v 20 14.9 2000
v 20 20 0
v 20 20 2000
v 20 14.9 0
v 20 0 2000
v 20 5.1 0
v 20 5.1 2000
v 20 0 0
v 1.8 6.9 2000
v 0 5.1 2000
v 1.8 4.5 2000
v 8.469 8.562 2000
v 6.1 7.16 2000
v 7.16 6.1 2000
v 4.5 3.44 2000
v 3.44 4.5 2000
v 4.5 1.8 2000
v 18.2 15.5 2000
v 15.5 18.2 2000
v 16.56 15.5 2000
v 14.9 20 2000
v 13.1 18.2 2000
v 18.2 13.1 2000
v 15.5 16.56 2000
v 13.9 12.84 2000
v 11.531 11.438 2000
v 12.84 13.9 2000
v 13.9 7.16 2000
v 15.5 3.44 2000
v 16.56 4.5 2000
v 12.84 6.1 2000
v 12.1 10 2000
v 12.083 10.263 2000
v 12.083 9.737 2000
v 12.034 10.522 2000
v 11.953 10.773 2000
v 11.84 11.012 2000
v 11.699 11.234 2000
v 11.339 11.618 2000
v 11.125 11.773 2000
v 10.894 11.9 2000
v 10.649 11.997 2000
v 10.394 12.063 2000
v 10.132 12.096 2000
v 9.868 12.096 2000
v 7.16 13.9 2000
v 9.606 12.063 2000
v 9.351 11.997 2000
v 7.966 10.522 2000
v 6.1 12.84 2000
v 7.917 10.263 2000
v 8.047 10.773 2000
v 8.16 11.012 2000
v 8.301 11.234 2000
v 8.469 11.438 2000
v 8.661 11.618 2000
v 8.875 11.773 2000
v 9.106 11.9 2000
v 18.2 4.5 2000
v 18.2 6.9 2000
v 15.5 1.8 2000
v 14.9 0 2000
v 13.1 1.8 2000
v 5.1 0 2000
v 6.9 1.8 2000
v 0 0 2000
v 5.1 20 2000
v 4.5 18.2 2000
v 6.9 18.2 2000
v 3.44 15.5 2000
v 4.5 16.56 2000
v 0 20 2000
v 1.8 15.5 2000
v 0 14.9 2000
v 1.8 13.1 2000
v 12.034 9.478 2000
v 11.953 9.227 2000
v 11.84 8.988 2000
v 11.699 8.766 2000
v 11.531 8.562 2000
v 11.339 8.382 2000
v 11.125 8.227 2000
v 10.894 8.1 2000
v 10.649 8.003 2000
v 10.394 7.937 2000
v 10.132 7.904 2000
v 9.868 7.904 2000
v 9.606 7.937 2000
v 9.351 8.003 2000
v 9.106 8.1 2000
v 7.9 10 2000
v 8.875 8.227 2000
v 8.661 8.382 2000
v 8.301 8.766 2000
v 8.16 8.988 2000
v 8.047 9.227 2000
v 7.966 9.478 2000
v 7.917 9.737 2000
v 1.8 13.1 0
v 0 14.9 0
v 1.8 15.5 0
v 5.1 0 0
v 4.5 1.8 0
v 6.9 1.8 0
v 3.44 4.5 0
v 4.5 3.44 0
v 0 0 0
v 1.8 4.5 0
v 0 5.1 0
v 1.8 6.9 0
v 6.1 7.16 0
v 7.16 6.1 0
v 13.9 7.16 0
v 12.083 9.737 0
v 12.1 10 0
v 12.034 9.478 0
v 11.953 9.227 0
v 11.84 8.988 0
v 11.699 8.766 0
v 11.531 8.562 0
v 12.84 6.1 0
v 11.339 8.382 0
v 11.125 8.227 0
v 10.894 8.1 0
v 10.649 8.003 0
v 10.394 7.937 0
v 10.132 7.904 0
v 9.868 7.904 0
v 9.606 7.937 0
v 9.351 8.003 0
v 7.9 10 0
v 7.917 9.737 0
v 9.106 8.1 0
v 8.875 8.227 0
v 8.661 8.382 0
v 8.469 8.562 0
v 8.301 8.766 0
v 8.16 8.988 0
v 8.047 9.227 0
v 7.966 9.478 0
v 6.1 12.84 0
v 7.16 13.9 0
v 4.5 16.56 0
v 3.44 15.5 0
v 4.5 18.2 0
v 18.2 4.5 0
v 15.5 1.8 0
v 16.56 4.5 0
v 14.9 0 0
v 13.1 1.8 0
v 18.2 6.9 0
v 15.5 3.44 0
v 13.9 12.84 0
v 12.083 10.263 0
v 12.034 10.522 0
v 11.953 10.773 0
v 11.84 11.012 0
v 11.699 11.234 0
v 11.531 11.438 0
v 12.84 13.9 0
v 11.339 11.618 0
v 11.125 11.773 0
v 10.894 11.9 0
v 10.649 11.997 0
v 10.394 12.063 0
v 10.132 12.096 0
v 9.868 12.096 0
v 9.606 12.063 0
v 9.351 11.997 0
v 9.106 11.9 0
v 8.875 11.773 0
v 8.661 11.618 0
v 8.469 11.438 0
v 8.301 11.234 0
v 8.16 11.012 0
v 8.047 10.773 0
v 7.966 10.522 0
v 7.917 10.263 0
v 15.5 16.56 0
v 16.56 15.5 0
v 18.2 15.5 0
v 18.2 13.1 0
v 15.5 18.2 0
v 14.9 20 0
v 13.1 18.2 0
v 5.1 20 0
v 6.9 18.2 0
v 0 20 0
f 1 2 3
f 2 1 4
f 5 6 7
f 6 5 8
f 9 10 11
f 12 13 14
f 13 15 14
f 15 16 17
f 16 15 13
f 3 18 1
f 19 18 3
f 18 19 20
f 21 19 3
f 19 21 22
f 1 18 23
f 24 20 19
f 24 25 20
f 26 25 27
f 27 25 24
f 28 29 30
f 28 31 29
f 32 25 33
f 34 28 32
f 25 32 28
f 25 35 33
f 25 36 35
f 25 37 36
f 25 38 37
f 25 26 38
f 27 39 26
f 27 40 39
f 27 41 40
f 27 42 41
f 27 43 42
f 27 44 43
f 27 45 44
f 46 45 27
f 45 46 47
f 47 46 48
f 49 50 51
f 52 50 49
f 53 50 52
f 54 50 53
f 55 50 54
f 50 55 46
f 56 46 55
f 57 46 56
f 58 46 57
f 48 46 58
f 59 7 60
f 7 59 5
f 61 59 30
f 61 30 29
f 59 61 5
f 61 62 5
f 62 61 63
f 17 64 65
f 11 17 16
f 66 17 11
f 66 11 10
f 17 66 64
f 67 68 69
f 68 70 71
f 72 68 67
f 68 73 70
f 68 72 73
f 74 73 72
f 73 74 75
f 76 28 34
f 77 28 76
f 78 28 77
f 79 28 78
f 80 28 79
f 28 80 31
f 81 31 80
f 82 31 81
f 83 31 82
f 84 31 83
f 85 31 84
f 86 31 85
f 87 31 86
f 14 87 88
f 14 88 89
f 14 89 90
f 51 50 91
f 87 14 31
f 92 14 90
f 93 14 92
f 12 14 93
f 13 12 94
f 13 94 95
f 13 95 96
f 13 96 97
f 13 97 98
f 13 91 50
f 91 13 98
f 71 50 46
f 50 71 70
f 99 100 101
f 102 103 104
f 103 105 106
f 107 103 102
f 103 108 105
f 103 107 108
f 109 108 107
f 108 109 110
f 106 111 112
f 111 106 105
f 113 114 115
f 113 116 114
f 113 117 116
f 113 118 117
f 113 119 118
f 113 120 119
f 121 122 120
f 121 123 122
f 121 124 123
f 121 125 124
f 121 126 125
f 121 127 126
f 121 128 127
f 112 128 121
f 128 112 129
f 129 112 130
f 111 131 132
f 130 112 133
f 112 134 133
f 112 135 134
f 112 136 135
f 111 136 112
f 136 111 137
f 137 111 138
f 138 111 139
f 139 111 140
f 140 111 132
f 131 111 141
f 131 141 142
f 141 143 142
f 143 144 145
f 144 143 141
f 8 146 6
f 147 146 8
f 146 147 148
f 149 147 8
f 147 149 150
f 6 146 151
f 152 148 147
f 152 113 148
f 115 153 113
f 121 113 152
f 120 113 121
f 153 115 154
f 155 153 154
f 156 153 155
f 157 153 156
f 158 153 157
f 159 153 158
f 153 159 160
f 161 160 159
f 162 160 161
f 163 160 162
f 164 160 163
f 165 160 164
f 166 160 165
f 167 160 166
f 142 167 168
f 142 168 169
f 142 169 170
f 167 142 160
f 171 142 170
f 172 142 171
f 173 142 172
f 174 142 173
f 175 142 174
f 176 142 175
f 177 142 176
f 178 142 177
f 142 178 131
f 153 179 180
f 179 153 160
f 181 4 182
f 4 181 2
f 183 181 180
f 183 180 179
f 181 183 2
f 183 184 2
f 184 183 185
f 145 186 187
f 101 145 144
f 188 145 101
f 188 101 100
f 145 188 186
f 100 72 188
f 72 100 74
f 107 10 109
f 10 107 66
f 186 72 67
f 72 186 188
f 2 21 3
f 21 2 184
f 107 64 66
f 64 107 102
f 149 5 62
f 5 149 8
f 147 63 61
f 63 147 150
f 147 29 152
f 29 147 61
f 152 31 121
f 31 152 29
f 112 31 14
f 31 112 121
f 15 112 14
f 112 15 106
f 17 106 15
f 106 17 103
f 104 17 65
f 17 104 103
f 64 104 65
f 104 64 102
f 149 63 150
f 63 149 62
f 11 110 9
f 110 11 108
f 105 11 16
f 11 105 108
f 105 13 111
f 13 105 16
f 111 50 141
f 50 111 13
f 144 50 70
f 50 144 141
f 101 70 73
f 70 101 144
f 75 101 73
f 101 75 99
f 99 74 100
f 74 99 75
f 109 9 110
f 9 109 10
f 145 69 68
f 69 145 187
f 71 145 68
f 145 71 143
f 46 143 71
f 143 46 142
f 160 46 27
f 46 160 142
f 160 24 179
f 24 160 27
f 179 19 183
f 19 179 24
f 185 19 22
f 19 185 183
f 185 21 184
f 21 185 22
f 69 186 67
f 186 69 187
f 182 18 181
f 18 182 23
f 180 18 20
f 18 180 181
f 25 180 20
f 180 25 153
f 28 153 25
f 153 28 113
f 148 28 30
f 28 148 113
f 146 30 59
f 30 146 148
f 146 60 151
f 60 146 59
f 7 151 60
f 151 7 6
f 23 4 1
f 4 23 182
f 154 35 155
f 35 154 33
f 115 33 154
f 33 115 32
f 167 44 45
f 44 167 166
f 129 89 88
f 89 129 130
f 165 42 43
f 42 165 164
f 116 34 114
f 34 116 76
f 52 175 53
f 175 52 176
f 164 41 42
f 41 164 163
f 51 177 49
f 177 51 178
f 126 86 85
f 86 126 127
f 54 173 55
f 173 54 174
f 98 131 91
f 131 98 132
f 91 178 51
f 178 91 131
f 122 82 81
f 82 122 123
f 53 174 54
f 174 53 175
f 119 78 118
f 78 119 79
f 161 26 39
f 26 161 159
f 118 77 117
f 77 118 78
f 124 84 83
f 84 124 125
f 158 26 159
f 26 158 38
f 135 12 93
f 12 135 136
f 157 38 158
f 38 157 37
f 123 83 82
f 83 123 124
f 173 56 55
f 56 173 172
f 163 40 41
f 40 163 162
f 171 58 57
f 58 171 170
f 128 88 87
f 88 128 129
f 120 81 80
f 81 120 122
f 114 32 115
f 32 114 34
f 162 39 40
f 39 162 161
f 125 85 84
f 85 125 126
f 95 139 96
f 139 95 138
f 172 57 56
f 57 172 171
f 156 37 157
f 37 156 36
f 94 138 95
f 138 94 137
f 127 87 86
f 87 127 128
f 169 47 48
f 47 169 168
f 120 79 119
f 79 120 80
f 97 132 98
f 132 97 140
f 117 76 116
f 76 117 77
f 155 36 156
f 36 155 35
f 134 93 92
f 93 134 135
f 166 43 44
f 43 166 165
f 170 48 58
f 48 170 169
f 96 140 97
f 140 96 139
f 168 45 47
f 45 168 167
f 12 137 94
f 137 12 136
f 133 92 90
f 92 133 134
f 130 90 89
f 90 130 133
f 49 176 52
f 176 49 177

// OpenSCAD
// Generated by SolidPython 1.1.3 on 2022-04-28 23:56:22


difference() {
	cube(size = [20.0000000000, 20.0000000000, 2000]);
	translate(v = [5.1000000000, 0, 0]) {
		linear_extrude(center = false, convexity = 10, height = 2000, twist = 0) {
			polygon(points = [[0.0000000000, 0.0000000000], [1.8000000000, 1.8000000000], [-0.6000000000, 1.8000000000], [-0.6000000000, 3.4400000000], [2.0600000000, 6.1000000000], [7.7400000000, 6.1000000000], [10.4000000000, 3.4400000000], [10.4000000000, 1.8000000000], [8, 1.8000000000], [9.8000000000, 0.0000000000], [0.0000000000, 0.0000000000]]);
		}
	}
	translate(v = [0, 14.9000000000, 0]) {
		rotate(a = [0, 0, 270]) {
			linear_extrude(center = false, convexity = 10, height = 2000, twist = 0) {
				polygon(points = [[0.0000000000, 0.0000000000], [1.8000000000, 1.8000000000], [-0.6000000000, 1.8000000000], [-0.6000000000, 3.4400000000], [2.0600000000, 6.1000000000], [7.7400000000, 6.1000000000], [10.4000000000, 3.4400000000], [10.4000000000, 1.8000000000], [8, 1.8000000000], [9.8000000000, 0.0000000000], [0.0000000000, 0.0000000000]]);
			}
		}
	}
	translate(v = [14.9000000000, 0, 0]) {
		translate(v = [0, 20.0000000000, 0]) {
			rotate(a = [0, 0, 180]) {
				linear_extrude(center = false, convexity = 10, height = 2000, twist = 0) {
					polygon(points = [[0.0000000000, 0.0000000000], [1.8000000000, 1.8000000000], [-0.6000000000, 1.8000000000], [-0.6000000000, 3.4400000000], [2.0600000000, 6.1000000000], [7.7400000000, 6.1000000000], [10.4000000000, 3.4400000000], [10.4000000000, 1.8000000000], [8, 1.8000000000], [9.8000000000, 0.0000000000], [0.0000000000, 0.0000000000]]);
				}
			}
		}
	}
	translate(v = [20.0000000000, 0, 0]) {
		translate(v = [0, 5.1000000000, 0]) {
			rotate(a = [0, 0, 90]) {
				linear_extrude(center = false, convexity = 10, height = 2000, twist = 0) {
					polygon(points = [[0.0000000000, 0.0000000000], [1.8000000000, 1.8000000000], [-0.6000000000, 1.8000000000], [-0.6000000000, 3.4400000000], [2.0600000000, 6.1000000000], [7.7400000000, 6.1000000000], [10.4000000000, 3.4400000000], [10.4000000000, 1.8000000000], [8, 1.8000000000], [9.8000000000, 0.0000000000], [0.0000000000, 0.0000000000]]);
				}
			}
		}
	}
	translate(v = [0, 10.0000000000, 0]) {
		translate(v = [10.0000000000, 0, 0]) {
			cylinder($fn = 50, h = 2000, r = 2.1000000000);
		}
	}
}
/***********************************************
*********      SolidPython code:      **********
************************************************
 
from solid import *
from solid.utils import *  # Not required, but the utils module is useful

GROOVE_WIDTH = 9.8

def make_groove(height):
    # Define the shape of the vslot grooves as a polygon.
    groove_points = [
        [0.0, 0.0, 0.0],
        [1.8, 1.8, 0.0],
        [-0.6, 1.8, 0.0],
        [-0.6, 3.44, 0.0],
        [2.06, 6.1, 0.0],
        [7.74, 6.1, 0.0],
        [10.4, 3.44, 0.0],
        [10.4, 1.8, 0.0],
        [8, 1.8, 0.0],
        [9.8, 0.0, 0.0],
        [0.0, 0.0, 0.0],
    ];

    # Extrude the groove polygon into a 3d object.
    return linear_extrude(height = height, center = False, convexity = 10, twist = 0)(
        polygon(groove_points)
    );

def make_2020(height):
    # Overall dimensions
    side = 20.0;

    translate_dist = (side/2) - (GROOVE_WIDTH/2);

    bottom_groove = right(translate_dist)(
        make_groove(height)
    );

    left_groove = forward(translate_dist + GROOVE_WIDTH)(
        rotate([0, 0, 270])(
            make_groove(height)
        )
    );

    top_groove = right(translate_dist + GROOVE_WIDTH)(
        forward(side)(
            rotate([0, 0, 180])(
                make_groove(height)
            )
        )
    );
    
    right_groove = right(side)(
        forward(translate_dist)(
            rotate([0, 0, 90])(
                make_groove(height)
            )
        )
    );

    center_hole = forward(side/2)(
        right(side/2)(
            cylinder(h=height, r=2.1, segments=50)
        )
    );

    return cube([side, side, height]) - bottom_groove - left_groove - top_groove - right_groove - center_hole;

# Test renders
scad_render_to_file(make_2020(250), '../../scad/vslot2020_250mm.scad');
scad_render_to_file(make_2020(500), '../../scad/vslot2020_500mm.scad');
scad_render_to_file(make_2020(1000), '../../scad/vslot2020_1000mm.scad');
scad_render_to_file(make_2020(1500), '../../scad/vslot2020_1500mm.scad');
scad_render_to_file(make_2020(2000), '../../scad/vslot2020_2000mm.scad');
scad_render_to_file(make_groove(250), '../../scad/vslotgroove.scad'); 
 
************************************************/
